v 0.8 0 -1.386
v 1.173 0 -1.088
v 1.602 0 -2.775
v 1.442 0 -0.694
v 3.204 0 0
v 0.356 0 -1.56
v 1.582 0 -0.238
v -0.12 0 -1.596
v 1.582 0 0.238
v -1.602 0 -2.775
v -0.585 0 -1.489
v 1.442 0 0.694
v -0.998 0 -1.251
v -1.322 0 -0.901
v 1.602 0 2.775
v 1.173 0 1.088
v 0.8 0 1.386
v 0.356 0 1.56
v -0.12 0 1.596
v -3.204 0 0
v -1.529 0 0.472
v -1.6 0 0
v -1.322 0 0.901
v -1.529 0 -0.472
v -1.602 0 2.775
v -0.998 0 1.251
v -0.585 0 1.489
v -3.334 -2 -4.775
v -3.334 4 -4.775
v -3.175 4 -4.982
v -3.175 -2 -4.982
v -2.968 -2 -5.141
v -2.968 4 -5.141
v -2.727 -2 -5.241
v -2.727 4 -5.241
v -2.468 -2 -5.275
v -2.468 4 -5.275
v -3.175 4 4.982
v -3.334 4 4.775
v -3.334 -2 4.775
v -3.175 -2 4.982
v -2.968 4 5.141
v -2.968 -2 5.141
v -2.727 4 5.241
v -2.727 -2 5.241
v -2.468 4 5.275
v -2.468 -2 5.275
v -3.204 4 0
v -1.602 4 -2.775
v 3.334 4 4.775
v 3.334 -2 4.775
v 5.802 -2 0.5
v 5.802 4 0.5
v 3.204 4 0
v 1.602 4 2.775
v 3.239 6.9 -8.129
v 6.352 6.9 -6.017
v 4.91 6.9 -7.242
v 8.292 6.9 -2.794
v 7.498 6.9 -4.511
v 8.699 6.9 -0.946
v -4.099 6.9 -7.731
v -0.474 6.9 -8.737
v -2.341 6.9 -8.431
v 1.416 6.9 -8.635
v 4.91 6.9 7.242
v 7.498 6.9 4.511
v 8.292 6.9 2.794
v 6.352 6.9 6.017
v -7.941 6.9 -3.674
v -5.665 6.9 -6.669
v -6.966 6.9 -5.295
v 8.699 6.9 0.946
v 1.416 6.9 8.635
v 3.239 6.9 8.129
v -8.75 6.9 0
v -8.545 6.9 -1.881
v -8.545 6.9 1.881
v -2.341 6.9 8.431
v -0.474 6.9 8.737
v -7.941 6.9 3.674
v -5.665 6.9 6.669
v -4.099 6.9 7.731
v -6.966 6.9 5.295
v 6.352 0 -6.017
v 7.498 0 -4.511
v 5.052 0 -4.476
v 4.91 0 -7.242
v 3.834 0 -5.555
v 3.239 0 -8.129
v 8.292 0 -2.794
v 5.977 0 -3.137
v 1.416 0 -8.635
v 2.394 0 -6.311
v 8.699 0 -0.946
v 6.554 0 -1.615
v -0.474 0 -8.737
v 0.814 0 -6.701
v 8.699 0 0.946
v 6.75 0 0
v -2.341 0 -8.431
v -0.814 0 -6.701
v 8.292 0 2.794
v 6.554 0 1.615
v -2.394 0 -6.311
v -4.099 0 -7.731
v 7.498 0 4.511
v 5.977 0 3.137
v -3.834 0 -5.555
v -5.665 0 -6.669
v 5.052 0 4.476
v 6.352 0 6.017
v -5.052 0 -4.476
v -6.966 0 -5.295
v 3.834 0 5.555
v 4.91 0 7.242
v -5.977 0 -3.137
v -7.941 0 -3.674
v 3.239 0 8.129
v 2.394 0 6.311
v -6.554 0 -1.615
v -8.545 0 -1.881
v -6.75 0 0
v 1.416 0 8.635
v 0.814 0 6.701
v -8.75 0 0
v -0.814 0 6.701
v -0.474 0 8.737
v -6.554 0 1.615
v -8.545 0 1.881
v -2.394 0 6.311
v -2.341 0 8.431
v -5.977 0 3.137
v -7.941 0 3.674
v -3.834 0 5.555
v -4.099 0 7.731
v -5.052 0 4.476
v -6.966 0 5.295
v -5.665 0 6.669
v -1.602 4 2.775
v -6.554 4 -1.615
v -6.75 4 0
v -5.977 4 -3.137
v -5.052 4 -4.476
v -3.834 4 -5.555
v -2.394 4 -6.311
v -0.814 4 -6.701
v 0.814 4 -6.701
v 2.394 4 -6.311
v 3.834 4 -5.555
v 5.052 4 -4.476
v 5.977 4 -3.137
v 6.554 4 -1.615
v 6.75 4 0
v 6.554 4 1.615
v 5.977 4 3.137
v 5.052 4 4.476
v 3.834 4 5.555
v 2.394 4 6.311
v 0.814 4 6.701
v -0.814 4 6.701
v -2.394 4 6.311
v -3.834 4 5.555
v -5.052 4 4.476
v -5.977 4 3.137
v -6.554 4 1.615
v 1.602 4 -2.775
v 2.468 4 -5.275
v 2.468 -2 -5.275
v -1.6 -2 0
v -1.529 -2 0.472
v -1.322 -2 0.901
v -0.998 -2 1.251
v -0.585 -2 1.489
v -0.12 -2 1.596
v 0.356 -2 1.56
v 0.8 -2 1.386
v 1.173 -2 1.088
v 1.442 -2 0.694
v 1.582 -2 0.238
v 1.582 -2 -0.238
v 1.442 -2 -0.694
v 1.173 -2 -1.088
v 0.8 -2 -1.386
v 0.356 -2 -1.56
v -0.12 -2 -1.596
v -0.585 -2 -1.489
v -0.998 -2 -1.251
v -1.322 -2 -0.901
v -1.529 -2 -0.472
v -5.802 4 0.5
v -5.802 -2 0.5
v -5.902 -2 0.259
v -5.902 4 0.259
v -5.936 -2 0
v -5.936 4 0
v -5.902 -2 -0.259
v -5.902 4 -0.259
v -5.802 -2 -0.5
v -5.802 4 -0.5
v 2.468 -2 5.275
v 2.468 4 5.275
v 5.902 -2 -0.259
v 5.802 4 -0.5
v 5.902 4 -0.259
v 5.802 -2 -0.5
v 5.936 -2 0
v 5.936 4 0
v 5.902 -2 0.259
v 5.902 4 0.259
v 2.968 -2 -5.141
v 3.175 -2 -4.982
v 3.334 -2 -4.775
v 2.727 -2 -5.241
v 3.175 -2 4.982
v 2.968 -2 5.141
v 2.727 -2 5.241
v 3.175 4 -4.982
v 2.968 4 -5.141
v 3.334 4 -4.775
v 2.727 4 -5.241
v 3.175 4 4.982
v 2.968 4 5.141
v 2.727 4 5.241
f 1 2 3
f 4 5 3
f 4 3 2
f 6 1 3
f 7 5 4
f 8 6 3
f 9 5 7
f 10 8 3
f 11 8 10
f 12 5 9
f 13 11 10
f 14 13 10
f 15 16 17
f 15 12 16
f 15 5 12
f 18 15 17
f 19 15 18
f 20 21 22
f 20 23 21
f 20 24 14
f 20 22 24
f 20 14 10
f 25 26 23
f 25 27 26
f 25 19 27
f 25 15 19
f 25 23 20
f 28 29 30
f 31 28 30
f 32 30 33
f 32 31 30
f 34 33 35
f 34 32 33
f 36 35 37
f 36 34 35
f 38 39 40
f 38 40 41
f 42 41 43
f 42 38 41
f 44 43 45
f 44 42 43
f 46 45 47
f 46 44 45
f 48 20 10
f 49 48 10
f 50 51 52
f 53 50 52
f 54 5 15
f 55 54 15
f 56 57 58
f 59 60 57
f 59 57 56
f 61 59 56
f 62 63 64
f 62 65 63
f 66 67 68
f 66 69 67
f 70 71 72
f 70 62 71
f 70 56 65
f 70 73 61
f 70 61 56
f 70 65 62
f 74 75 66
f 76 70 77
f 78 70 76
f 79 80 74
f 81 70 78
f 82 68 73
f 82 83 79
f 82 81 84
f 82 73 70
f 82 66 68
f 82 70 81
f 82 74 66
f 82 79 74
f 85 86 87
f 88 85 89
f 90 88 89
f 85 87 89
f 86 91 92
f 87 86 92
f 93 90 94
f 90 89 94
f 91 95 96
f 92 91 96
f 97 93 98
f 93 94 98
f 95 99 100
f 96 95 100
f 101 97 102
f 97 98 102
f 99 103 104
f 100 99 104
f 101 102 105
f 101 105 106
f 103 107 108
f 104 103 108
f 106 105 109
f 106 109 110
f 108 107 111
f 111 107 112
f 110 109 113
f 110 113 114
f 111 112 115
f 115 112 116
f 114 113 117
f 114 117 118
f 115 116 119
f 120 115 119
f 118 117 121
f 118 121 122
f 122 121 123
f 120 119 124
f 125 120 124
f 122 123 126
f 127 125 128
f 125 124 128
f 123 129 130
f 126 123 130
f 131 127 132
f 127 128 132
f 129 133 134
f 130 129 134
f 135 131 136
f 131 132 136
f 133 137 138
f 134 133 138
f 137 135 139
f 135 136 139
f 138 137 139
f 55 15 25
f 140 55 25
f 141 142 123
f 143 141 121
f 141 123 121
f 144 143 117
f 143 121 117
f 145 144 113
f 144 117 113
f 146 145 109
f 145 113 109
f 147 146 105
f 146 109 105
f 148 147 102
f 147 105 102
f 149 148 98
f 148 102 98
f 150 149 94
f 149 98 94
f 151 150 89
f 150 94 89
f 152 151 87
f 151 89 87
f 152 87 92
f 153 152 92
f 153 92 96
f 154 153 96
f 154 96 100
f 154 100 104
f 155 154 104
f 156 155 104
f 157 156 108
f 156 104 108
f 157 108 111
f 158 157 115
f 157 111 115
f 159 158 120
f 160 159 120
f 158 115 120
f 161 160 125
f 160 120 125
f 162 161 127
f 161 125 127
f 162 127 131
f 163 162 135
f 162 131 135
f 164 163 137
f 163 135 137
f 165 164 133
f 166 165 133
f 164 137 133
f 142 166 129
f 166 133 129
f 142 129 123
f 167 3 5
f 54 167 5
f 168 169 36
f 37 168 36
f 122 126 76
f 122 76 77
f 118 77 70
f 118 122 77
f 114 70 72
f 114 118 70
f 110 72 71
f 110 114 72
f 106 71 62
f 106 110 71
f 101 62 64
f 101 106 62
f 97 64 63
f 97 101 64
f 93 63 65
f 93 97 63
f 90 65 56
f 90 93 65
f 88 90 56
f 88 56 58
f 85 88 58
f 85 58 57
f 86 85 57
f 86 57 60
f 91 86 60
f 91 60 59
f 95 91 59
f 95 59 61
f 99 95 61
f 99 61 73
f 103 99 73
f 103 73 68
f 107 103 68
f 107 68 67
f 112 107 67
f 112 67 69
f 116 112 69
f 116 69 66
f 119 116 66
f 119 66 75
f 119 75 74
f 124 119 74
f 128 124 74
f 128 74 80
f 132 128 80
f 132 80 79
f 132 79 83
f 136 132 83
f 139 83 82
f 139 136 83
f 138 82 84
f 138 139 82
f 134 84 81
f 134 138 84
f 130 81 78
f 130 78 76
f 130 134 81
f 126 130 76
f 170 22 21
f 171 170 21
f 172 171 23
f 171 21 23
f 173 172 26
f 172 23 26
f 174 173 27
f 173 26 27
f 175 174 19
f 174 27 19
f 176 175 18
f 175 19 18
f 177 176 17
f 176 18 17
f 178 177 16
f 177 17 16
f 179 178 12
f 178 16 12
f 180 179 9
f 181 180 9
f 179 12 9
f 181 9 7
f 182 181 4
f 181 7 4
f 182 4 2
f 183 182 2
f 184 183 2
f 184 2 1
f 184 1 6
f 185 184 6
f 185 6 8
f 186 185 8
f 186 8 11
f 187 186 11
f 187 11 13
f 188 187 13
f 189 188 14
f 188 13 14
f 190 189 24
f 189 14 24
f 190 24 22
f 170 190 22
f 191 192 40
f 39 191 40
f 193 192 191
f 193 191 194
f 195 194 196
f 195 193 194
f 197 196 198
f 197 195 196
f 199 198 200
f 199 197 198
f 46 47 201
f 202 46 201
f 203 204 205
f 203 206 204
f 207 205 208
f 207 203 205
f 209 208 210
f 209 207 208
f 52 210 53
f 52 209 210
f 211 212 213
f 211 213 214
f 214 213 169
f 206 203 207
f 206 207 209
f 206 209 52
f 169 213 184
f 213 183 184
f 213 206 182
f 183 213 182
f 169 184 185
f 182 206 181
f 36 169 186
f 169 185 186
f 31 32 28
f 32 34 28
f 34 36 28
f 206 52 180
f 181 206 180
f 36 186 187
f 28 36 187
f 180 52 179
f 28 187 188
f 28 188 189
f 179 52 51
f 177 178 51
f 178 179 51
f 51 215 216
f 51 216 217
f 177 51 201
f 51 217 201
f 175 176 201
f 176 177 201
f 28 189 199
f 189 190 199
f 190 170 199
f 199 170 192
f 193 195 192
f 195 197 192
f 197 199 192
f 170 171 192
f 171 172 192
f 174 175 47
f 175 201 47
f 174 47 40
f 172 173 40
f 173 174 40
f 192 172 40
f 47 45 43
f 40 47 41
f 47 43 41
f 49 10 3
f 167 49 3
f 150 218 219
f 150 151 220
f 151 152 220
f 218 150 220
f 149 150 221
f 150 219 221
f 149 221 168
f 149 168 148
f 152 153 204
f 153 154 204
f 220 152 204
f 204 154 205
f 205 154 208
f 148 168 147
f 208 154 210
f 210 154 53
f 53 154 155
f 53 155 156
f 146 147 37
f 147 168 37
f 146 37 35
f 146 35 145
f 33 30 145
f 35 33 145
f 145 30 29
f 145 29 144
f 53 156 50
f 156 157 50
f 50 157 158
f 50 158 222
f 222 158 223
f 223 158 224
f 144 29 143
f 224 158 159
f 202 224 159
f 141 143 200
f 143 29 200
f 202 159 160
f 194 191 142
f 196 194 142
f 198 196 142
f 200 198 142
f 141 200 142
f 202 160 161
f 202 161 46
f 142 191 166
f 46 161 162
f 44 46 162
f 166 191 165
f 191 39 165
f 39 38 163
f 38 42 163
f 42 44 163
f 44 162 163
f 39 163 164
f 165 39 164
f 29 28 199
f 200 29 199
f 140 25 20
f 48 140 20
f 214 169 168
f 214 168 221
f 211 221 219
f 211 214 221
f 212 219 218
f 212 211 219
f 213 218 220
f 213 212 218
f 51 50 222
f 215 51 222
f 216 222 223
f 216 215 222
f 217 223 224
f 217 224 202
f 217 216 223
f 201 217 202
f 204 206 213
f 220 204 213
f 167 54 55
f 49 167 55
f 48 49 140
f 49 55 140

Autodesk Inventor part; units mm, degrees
ref_plane "YZ Plane" through (0, 0, 0) normal (1, 0, 0) x (0, 1, 0)
ref_plane "XZ Plane" through (0, 0, 0) normal (0, 1, 0) x (-1, 0, 0)
ref_plane "XY Plane" through (0, 0, 0) normal (0, 0, 1) x (1, 0, 0)
sketch "Sketch1" plane through (0, 0, 0) normal (0, 1, 0) x (-1, 0, 0)
  line L0 (-8.75, 22.75) -> (8.75, 22.75)
  line L1 (8.75, 22.75) -> (8.75, -22.75)
  line L2 (8.75, -22.75) -> (-8.75, -22.75)
  line L3 (-8.75, -22.75) -> (-8.75, 22.75)
  line L4 (-8.75, 22.75) -> (8.75, -22.75) construction
  line L5 (8.75, 22.75) -> (-8.75, -22.75) construction
  line L6 (-1.6021, -2.775) -> (-3.2043, 0)
  line L7 (-3.2043, 0) -> (-1.6021, 2.775)
  line L8 (-1.6021, 2.775) -> (1.6021, 2.775)
  line L9 (1.6021, 2.775) -> (3.2043, 0)
  line L10 (3.2043, 0) -> (1.6021, -2.775)
  line L11 (1.6021, -2.775) -> (-1.6021, -2.775)
  line L12 (6.091, 0) -> (3.0455, 5.275)
  line L13 (3.0455, 5.275) -> (-3.0455, 5.275)
  line L14 (-3.0455, 5.275) -> (-6.091, 0)
  line L15 (-6.091, 0) -> (-3.0455, -5.275)
  line L16 (-3.0455, -5.275) -> (3.0455, -5.275)
  line L17 (3.0455, -5.275) -> (6.091, 0)
  line L18 (6.75, -20.75) -> (6.75, 20.75)
  line L19 (6.75, 20.75) -> (-6.75, 20.75)
  line L20 (-6.75, 20.75) -> (-6.75, -20.75)
  line L21 (-6.75, -20.75) -> (6.75, -20.75)
  circle A0 centre (0, 0) radius 1.6
  circle A1 centre (0, 0) radius 8.75
  circle A2 centre (0, 0) radius 6.75
  dimension "d0" = 17.5
  dimension "d1" = 45.5
  dimension "d2" = 5.55
  dimension "d8" = 2.5
  dimension "d9" = 2
  dimension "d11" = 3.2
  dimension "d14" = 17.5
  dimension "d15" = 2
extrude "Extrusion1" add sketch "Sketch1" along normal blind 6.9 contours A1 L20 | A1 L18 | A1 L18 A2 L20 | L20 A2 L18 A1 | A2 | L6 L7 L8 L9 L10 L11 | L17 L16 L15 L14 L13 L12 | A0
extrude "Extrusion5" add sketch "Sketch1" against normal blind 2 contours L6 L7 L8 L9 L10 L11 | L17 L16 L15 L14 L13 L12
extrude "Extrusion2" cut sketch "Sketch1" along normal blind 4 contours A2 | L6 L7 L8 L9 L10 L11 | A0
fillet "Fillet1" radius 1 6 edges at (6.091, 1, 0) (-3.0455, 1, 5.275) (3.0455, 1, -5.275) (-3.0455, 1, -5.275) (-6.091, 1, 0) (3.0455, 1, 5.275)
fillet "Fillet2" [suppressed]
equation "\"d14\" = d0"
properties part number "Solenoid Shield"
